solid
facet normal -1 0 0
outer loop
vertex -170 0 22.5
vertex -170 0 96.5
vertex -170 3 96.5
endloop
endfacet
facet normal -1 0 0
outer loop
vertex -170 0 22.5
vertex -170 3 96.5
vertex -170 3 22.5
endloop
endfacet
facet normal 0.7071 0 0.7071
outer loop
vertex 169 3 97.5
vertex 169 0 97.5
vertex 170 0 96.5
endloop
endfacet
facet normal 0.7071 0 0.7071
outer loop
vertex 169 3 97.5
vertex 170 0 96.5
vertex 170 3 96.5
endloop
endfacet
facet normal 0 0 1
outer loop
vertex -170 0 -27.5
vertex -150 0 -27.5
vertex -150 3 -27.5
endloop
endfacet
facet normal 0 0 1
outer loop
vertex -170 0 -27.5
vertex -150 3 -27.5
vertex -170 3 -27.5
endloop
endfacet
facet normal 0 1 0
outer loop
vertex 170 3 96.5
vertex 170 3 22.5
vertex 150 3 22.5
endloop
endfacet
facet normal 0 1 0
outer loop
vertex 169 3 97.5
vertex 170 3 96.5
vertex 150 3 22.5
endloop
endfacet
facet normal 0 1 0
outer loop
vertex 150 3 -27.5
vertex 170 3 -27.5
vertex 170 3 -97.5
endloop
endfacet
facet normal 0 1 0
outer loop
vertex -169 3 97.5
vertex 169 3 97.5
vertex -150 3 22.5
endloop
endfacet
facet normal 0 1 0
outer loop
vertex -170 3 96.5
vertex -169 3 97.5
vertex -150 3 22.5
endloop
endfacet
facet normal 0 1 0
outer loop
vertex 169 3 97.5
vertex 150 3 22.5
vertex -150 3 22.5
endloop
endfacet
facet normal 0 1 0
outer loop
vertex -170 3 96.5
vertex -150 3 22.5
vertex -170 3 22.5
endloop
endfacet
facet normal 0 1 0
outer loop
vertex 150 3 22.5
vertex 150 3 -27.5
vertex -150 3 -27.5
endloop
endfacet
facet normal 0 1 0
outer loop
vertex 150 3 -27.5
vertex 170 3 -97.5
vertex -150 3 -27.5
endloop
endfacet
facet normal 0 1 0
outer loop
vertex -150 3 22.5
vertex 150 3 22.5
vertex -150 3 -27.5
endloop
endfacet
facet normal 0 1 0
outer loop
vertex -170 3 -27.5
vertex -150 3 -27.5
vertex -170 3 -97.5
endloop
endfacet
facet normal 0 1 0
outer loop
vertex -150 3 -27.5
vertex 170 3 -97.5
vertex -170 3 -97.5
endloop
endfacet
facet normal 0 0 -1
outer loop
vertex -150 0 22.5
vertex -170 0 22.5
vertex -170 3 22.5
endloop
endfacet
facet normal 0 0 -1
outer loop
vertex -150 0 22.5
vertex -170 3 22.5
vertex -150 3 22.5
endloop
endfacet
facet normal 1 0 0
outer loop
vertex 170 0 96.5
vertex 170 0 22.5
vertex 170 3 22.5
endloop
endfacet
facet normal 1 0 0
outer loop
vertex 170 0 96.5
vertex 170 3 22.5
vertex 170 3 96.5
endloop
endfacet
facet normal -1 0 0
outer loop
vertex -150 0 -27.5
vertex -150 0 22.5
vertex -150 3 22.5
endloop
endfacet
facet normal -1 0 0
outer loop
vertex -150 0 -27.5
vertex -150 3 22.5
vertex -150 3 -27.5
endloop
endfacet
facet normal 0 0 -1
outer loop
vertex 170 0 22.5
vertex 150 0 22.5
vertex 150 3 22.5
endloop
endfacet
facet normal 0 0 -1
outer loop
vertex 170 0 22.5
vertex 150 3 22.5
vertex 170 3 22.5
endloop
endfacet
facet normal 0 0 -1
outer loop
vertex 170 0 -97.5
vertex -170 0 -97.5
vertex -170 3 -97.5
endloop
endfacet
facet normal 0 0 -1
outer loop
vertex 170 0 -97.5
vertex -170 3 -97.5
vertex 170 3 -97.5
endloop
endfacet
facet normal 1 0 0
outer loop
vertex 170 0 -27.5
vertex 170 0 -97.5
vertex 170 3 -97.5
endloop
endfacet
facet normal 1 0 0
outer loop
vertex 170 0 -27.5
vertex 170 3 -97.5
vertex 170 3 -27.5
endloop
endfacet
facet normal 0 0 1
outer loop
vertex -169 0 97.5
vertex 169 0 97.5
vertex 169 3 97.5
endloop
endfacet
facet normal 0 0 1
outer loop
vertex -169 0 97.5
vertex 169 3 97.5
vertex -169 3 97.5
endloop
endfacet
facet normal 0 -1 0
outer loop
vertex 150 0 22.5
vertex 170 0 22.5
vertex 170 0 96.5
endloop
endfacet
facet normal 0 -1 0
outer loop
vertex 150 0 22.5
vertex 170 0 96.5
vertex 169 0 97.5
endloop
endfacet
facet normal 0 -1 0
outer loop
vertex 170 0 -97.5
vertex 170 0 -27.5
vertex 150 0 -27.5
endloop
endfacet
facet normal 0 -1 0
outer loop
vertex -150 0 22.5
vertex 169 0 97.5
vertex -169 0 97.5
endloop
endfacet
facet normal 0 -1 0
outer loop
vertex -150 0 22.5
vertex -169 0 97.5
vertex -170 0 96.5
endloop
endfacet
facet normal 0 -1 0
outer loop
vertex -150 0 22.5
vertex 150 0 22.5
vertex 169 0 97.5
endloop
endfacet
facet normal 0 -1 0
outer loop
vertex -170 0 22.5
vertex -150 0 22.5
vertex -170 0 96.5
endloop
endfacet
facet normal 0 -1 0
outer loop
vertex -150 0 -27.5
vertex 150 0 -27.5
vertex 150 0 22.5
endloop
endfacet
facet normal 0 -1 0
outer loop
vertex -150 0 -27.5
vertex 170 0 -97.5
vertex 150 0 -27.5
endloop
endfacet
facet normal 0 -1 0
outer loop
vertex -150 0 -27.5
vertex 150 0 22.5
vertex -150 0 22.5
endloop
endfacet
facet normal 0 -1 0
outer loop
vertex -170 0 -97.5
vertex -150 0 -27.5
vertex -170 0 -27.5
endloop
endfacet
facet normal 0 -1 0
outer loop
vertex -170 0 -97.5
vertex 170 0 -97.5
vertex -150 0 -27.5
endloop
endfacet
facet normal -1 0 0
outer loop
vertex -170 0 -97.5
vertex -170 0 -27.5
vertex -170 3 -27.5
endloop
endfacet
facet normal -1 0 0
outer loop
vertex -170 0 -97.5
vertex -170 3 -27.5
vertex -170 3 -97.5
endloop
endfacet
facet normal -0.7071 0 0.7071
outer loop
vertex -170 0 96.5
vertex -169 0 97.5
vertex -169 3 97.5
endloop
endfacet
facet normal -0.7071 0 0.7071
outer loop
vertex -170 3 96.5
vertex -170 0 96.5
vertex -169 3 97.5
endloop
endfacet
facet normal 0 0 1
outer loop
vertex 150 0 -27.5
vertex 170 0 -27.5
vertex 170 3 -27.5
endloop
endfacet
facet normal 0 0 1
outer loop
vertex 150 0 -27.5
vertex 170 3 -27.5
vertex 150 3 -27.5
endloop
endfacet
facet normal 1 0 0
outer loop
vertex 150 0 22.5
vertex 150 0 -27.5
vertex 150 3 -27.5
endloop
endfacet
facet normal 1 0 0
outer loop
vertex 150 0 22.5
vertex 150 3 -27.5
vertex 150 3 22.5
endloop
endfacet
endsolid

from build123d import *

# Parameters (mm, degrees)
BOSS_EXTRUDE1_DEPTH = 3
CHAMFER1_SIZE       = 1


with BuildPart() as part:
    # Sketch1 → Boss-Extrude1 (new body)
    with BuildSketch(Plane(origin=(0, 0, 0), x_dir=(1, 0, 0), z_dir=(0, 1, 0))):
        Polygon((-170, -97.5), (-170, -22.5), (-150, -22.5), (-150, 27.5), (-170, 27.5), (-170, 97.5), (170, 97.5), (170, 27.5), (150, 27.5), (150, -22.5), (170, -22.5), (170, -97.5), align=None)
    extrude(amount=BOSS_EXTRUDE1_DEPTH)

    # Chamfer1
    chamfer1_edges = [part.edges().sort_by_distance(p)[0] for p in [
        (-170, 1.5, 97.5),
        (170, 1.5, 97.5),
    ]]
    chamfer(chamfer1_edges, length=CHAMFER1_SIZE)


solid = part.part
